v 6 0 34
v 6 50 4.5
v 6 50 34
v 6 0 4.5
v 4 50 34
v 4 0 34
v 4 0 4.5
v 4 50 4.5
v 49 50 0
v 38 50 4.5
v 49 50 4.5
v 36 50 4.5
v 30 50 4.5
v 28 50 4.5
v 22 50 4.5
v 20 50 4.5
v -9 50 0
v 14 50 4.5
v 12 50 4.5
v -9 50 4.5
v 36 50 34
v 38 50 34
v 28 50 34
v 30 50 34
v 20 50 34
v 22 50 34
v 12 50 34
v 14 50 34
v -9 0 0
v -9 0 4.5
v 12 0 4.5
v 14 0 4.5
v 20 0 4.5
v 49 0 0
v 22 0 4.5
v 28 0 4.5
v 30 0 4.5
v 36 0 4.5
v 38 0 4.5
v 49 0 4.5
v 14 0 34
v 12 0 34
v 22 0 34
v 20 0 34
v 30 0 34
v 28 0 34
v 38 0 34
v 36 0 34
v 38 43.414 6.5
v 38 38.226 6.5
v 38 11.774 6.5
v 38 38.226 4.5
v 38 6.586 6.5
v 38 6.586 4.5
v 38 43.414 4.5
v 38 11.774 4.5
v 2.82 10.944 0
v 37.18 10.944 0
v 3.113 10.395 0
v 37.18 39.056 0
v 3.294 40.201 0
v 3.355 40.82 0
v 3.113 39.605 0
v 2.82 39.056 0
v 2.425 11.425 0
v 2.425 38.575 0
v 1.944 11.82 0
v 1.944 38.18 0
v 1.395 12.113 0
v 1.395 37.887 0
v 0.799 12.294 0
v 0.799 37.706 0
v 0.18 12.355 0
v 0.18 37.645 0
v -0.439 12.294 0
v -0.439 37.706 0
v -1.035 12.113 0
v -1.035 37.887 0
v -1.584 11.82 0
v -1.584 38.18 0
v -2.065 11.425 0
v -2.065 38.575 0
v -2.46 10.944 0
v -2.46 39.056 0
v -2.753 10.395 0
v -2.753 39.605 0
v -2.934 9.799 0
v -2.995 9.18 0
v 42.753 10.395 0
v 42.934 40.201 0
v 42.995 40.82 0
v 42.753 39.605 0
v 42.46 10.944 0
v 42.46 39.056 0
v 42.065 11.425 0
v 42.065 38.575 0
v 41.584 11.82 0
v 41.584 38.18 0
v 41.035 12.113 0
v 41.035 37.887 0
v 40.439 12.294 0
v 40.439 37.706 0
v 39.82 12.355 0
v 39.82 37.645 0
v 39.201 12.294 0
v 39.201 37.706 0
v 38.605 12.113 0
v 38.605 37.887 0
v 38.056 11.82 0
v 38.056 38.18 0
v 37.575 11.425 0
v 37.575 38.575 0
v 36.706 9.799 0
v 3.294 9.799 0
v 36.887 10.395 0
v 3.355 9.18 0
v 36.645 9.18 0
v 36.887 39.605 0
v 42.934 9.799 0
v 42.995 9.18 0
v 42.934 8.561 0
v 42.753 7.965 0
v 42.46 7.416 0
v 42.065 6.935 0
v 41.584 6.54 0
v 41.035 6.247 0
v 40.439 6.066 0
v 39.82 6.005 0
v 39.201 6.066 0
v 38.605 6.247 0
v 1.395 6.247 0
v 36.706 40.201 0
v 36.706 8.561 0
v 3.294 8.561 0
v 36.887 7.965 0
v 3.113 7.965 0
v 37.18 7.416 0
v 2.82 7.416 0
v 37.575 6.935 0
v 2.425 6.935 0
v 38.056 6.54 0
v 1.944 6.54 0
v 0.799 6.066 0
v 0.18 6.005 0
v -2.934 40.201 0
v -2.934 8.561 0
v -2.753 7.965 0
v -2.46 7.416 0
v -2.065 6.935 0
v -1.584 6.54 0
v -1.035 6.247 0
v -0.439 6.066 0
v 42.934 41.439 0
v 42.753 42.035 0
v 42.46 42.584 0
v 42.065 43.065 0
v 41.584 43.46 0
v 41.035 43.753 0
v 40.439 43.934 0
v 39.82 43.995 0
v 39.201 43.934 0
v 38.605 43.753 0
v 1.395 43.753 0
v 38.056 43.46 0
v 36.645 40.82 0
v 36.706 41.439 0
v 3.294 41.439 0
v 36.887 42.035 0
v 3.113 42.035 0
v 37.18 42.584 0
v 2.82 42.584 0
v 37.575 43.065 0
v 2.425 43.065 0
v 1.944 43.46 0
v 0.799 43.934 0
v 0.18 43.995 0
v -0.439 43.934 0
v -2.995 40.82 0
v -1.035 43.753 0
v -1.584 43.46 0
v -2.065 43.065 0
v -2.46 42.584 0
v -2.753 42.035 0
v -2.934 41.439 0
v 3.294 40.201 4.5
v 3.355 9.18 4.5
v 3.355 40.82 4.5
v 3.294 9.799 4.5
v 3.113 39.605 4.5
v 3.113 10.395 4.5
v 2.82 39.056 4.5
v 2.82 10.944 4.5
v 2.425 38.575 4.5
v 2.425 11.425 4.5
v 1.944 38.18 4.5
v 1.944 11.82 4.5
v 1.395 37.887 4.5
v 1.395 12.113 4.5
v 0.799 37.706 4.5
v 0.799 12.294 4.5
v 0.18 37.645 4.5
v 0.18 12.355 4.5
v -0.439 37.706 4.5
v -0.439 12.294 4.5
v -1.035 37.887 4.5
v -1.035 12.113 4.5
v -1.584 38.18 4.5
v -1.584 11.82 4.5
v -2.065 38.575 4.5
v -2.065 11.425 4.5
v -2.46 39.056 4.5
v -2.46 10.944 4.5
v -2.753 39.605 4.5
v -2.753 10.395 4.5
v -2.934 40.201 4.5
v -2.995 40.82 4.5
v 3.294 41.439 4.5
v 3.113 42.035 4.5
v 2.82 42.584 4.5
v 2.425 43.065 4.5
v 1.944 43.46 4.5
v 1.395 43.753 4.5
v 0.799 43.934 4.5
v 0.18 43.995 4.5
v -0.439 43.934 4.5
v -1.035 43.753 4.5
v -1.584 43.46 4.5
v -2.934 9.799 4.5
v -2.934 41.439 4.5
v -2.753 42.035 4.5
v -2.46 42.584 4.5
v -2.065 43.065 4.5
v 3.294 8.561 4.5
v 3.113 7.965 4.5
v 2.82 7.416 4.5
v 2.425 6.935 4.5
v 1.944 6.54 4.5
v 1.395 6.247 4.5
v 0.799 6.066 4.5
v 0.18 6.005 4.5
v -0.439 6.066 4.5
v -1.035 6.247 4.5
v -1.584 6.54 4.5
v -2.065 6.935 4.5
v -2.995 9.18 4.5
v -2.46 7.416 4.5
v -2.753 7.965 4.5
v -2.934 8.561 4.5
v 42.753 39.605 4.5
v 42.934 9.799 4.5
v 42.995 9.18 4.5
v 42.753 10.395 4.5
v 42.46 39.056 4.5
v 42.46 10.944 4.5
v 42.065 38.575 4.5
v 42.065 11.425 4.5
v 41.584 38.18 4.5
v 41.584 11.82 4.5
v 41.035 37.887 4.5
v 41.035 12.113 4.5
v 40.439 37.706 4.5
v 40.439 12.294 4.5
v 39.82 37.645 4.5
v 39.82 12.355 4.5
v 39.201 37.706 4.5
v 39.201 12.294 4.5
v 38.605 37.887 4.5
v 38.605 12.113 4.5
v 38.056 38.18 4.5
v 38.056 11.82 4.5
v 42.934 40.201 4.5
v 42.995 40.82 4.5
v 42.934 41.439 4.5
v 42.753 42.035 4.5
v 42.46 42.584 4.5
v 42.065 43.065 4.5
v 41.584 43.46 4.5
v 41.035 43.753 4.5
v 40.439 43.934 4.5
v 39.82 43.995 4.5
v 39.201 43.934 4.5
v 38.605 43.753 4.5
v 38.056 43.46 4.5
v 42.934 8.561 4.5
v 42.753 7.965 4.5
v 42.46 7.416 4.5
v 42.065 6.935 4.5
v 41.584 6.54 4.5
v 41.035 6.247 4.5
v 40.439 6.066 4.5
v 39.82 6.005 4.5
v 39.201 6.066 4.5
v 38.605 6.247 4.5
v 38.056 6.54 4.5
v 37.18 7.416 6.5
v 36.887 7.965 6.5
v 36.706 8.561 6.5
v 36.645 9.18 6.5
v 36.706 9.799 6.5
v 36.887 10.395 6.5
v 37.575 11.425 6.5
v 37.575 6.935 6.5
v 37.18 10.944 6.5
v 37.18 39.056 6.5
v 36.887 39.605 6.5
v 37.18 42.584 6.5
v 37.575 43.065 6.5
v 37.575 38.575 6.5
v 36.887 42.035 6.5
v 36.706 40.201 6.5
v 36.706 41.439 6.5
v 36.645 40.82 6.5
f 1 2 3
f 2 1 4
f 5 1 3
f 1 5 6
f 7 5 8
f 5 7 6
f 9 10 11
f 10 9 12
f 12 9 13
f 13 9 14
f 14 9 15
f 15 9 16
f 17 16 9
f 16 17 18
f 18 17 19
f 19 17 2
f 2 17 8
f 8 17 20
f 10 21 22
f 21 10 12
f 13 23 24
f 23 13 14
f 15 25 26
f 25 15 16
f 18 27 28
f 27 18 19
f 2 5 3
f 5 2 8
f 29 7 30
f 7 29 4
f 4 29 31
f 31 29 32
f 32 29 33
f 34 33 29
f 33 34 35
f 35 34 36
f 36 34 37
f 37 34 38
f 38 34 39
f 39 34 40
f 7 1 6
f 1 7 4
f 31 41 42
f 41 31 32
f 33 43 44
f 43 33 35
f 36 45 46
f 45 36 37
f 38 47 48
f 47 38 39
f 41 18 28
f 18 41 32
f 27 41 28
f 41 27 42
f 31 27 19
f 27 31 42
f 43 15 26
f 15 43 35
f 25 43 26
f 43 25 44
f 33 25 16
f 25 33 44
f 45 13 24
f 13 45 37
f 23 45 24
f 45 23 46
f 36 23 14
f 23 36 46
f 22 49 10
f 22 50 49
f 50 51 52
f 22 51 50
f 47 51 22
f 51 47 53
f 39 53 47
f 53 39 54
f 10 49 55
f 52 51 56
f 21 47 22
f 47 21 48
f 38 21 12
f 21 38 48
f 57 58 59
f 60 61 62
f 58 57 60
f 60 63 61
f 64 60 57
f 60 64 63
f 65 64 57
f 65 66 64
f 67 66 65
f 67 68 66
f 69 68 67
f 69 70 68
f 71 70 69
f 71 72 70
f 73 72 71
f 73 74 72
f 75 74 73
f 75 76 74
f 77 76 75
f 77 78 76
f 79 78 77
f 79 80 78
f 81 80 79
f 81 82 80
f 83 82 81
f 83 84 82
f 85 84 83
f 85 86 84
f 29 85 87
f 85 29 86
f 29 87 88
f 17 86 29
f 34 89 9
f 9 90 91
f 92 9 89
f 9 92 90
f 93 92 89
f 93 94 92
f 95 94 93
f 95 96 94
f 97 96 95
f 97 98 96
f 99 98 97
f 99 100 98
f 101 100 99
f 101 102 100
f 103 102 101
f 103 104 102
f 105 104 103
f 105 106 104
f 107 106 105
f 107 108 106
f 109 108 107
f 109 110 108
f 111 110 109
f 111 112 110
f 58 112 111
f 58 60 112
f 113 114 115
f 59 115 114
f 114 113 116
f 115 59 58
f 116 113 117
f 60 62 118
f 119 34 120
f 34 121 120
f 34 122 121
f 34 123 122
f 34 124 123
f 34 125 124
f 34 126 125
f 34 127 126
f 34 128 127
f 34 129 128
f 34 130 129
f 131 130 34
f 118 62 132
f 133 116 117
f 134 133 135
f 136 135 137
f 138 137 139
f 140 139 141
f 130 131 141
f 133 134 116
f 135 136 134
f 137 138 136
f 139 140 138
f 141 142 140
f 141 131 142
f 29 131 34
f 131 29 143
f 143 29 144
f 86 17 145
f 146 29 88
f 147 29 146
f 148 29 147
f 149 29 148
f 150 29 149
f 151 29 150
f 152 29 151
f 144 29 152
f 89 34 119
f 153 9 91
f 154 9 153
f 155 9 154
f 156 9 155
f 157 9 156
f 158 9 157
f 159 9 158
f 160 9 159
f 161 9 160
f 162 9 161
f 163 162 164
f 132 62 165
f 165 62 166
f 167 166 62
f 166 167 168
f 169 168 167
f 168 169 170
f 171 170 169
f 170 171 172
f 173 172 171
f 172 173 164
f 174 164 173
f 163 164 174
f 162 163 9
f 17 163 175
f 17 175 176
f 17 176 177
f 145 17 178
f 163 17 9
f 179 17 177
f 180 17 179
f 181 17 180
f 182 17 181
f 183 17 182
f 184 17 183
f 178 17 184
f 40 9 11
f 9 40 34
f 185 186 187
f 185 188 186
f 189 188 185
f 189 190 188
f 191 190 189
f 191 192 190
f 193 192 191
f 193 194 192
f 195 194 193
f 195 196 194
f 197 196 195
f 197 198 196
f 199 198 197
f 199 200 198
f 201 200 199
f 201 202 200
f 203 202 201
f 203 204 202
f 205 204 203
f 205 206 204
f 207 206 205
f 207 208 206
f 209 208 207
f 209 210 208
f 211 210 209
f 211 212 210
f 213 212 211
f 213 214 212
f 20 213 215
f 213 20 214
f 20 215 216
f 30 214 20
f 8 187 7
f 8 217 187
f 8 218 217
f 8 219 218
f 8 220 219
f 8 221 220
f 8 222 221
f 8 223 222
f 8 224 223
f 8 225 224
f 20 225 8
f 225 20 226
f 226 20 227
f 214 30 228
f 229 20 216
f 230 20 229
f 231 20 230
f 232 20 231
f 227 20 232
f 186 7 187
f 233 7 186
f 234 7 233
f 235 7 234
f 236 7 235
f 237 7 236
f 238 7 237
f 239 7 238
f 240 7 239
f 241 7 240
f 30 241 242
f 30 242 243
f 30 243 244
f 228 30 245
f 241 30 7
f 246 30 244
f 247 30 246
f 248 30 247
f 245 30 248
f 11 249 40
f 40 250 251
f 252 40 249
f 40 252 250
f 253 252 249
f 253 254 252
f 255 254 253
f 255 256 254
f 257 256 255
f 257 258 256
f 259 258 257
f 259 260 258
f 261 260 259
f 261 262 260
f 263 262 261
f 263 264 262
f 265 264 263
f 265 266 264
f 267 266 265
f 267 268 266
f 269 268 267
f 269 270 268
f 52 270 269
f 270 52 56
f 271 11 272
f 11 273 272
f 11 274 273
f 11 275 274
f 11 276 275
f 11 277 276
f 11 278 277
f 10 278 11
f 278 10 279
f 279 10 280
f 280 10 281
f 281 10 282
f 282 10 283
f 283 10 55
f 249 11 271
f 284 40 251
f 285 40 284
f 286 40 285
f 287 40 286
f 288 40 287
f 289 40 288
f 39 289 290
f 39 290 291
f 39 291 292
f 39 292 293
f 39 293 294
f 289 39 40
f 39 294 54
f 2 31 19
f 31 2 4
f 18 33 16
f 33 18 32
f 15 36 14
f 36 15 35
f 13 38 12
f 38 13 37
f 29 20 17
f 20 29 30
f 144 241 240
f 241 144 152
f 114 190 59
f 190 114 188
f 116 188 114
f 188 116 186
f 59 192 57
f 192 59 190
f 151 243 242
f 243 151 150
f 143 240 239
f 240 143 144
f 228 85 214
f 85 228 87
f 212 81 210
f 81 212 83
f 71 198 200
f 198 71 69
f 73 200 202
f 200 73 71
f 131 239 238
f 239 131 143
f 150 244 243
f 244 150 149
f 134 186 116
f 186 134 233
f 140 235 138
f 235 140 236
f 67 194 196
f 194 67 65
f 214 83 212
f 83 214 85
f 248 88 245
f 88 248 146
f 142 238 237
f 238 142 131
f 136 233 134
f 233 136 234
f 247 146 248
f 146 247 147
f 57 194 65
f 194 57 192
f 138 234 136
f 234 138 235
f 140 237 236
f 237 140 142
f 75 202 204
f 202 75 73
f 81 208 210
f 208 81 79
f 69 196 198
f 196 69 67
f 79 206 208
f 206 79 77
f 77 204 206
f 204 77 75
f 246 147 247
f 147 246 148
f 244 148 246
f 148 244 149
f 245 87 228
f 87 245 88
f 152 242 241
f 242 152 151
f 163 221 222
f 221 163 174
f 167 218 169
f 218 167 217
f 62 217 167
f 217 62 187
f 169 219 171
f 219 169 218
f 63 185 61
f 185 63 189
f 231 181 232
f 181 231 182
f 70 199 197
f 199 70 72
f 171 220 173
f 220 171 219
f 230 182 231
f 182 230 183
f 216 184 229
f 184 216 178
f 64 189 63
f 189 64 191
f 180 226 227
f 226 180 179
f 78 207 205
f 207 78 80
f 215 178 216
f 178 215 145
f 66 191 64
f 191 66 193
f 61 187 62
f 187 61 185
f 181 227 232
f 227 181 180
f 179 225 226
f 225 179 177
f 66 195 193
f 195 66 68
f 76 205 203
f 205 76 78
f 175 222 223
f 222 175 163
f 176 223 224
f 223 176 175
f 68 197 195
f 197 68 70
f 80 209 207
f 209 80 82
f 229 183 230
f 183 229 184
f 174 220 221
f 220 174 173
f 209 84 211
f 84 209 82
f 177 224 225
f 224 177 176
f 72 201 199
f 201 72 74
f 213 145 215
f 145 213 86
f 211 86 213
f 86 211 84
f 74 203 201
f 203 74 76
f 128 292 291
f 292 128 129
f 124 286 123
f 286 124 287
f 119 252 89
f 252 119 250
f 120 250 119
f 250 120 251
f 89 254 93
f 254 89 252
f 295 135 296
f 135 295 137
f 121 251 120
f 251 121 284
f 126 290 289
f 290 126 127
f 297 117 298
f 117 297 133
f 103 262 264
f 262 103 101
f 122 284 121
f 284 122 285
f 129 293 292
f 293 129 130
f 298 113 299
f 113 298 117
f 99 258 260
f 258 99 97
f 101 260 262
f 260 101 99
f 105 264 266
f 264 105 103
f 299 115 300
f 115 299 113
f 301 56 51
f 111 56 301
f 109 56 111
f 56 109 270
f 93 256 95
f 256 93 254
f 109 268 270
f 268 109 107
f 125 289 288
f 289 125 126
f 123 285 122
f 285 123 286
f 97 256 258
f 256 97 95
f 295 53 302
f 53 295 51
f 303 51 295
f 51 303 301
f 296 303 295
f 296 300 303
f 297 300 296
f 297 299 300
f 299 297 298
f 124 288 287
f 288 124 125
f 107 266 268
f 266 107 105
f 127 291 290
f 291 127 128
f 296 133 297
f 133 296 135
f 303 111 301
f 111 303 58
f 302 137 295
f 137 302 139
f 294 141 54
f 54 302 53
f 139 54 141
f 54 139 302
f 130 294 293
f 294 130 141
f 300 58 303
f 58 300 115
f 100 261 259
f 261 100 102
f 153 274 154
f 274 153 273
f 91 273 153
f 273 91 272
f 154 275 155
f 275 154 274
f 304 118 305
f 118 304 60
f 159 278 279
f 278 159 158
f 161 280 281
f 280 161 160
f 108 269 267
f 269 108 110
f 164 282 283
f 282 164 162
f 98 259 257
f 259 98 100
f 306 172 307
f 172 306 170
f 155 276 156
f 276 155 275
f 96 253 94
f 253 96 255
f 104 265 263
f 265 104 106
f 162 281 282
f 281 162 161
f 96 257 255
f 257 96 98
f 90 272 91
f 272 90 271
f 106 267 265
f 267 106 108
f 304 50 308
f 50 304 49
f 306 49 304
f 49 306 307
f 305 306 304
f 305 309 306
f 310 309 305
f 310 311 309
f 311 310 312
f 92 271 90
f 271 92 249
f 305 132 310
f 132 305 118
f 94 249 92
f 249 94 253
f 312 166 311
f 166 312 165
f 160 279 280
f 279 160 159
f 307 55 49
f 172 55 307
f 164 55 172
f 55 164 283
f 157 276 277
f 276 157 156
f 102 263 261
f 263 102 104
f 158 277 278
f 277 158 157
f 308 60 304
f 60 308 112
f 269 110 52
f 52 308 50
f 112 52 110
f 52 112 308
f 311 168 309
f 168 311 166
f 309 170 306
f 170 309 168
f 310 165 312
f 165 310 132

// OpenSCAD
$fn = 32;

// ----------------------------------------------------------------------
// Finned heat sink: 40 x 50 mm base, 30 mm fins
// ----------------------------------------------------------------------

// --- parameters (mm) ---
base_w = 40;              // base width
base_d = 50;              // base depth
base_t = 4;               // base thickness
fin_h = 30;               // fin height above the base
holes_d = 6.35;           // fixing holes
hole_x = 19.82;           // hole offset in x
hole_y = 15.82;           // hole offset in y
fin_t = 2;                // fin thickness
fin_pitch = 8;            // fin pitch
fin_count = 5;            // number of fins
fin_x0 = 4;               // first fin offset
flange_w = 58;            // flange plate width
flange_t = 4;             // flange plate thickness

difference() {
  union() {
    cube([base_w, base_d, base_t]);
    for (i = [0 : fin_count - 1]) {
      translate([fin_x0 + i * fin_pitch, 0, base_t - 0.5]) cube([fin_t, base_d, fin_h + 0.5]);
    }
    /* mounting flange, a wider plate sharing the base bottom */
    translate([(base_w - flange_w) / 2, 0, 0]) cube([flange_w, base_d, flange_t + 0.5]);
  }
  /* fixing holes through the base, 2.5 mm clear on both sides */
  for (hx = [-19.82, 19.82]) {
    for (hy = [-15.82, 15.82]) {
      translate([base_w / 2 + hx, base_d / 2 + hy, -2.5]) cylinder(h = base_t + 5, d = holes_d);
    }
  }
}
